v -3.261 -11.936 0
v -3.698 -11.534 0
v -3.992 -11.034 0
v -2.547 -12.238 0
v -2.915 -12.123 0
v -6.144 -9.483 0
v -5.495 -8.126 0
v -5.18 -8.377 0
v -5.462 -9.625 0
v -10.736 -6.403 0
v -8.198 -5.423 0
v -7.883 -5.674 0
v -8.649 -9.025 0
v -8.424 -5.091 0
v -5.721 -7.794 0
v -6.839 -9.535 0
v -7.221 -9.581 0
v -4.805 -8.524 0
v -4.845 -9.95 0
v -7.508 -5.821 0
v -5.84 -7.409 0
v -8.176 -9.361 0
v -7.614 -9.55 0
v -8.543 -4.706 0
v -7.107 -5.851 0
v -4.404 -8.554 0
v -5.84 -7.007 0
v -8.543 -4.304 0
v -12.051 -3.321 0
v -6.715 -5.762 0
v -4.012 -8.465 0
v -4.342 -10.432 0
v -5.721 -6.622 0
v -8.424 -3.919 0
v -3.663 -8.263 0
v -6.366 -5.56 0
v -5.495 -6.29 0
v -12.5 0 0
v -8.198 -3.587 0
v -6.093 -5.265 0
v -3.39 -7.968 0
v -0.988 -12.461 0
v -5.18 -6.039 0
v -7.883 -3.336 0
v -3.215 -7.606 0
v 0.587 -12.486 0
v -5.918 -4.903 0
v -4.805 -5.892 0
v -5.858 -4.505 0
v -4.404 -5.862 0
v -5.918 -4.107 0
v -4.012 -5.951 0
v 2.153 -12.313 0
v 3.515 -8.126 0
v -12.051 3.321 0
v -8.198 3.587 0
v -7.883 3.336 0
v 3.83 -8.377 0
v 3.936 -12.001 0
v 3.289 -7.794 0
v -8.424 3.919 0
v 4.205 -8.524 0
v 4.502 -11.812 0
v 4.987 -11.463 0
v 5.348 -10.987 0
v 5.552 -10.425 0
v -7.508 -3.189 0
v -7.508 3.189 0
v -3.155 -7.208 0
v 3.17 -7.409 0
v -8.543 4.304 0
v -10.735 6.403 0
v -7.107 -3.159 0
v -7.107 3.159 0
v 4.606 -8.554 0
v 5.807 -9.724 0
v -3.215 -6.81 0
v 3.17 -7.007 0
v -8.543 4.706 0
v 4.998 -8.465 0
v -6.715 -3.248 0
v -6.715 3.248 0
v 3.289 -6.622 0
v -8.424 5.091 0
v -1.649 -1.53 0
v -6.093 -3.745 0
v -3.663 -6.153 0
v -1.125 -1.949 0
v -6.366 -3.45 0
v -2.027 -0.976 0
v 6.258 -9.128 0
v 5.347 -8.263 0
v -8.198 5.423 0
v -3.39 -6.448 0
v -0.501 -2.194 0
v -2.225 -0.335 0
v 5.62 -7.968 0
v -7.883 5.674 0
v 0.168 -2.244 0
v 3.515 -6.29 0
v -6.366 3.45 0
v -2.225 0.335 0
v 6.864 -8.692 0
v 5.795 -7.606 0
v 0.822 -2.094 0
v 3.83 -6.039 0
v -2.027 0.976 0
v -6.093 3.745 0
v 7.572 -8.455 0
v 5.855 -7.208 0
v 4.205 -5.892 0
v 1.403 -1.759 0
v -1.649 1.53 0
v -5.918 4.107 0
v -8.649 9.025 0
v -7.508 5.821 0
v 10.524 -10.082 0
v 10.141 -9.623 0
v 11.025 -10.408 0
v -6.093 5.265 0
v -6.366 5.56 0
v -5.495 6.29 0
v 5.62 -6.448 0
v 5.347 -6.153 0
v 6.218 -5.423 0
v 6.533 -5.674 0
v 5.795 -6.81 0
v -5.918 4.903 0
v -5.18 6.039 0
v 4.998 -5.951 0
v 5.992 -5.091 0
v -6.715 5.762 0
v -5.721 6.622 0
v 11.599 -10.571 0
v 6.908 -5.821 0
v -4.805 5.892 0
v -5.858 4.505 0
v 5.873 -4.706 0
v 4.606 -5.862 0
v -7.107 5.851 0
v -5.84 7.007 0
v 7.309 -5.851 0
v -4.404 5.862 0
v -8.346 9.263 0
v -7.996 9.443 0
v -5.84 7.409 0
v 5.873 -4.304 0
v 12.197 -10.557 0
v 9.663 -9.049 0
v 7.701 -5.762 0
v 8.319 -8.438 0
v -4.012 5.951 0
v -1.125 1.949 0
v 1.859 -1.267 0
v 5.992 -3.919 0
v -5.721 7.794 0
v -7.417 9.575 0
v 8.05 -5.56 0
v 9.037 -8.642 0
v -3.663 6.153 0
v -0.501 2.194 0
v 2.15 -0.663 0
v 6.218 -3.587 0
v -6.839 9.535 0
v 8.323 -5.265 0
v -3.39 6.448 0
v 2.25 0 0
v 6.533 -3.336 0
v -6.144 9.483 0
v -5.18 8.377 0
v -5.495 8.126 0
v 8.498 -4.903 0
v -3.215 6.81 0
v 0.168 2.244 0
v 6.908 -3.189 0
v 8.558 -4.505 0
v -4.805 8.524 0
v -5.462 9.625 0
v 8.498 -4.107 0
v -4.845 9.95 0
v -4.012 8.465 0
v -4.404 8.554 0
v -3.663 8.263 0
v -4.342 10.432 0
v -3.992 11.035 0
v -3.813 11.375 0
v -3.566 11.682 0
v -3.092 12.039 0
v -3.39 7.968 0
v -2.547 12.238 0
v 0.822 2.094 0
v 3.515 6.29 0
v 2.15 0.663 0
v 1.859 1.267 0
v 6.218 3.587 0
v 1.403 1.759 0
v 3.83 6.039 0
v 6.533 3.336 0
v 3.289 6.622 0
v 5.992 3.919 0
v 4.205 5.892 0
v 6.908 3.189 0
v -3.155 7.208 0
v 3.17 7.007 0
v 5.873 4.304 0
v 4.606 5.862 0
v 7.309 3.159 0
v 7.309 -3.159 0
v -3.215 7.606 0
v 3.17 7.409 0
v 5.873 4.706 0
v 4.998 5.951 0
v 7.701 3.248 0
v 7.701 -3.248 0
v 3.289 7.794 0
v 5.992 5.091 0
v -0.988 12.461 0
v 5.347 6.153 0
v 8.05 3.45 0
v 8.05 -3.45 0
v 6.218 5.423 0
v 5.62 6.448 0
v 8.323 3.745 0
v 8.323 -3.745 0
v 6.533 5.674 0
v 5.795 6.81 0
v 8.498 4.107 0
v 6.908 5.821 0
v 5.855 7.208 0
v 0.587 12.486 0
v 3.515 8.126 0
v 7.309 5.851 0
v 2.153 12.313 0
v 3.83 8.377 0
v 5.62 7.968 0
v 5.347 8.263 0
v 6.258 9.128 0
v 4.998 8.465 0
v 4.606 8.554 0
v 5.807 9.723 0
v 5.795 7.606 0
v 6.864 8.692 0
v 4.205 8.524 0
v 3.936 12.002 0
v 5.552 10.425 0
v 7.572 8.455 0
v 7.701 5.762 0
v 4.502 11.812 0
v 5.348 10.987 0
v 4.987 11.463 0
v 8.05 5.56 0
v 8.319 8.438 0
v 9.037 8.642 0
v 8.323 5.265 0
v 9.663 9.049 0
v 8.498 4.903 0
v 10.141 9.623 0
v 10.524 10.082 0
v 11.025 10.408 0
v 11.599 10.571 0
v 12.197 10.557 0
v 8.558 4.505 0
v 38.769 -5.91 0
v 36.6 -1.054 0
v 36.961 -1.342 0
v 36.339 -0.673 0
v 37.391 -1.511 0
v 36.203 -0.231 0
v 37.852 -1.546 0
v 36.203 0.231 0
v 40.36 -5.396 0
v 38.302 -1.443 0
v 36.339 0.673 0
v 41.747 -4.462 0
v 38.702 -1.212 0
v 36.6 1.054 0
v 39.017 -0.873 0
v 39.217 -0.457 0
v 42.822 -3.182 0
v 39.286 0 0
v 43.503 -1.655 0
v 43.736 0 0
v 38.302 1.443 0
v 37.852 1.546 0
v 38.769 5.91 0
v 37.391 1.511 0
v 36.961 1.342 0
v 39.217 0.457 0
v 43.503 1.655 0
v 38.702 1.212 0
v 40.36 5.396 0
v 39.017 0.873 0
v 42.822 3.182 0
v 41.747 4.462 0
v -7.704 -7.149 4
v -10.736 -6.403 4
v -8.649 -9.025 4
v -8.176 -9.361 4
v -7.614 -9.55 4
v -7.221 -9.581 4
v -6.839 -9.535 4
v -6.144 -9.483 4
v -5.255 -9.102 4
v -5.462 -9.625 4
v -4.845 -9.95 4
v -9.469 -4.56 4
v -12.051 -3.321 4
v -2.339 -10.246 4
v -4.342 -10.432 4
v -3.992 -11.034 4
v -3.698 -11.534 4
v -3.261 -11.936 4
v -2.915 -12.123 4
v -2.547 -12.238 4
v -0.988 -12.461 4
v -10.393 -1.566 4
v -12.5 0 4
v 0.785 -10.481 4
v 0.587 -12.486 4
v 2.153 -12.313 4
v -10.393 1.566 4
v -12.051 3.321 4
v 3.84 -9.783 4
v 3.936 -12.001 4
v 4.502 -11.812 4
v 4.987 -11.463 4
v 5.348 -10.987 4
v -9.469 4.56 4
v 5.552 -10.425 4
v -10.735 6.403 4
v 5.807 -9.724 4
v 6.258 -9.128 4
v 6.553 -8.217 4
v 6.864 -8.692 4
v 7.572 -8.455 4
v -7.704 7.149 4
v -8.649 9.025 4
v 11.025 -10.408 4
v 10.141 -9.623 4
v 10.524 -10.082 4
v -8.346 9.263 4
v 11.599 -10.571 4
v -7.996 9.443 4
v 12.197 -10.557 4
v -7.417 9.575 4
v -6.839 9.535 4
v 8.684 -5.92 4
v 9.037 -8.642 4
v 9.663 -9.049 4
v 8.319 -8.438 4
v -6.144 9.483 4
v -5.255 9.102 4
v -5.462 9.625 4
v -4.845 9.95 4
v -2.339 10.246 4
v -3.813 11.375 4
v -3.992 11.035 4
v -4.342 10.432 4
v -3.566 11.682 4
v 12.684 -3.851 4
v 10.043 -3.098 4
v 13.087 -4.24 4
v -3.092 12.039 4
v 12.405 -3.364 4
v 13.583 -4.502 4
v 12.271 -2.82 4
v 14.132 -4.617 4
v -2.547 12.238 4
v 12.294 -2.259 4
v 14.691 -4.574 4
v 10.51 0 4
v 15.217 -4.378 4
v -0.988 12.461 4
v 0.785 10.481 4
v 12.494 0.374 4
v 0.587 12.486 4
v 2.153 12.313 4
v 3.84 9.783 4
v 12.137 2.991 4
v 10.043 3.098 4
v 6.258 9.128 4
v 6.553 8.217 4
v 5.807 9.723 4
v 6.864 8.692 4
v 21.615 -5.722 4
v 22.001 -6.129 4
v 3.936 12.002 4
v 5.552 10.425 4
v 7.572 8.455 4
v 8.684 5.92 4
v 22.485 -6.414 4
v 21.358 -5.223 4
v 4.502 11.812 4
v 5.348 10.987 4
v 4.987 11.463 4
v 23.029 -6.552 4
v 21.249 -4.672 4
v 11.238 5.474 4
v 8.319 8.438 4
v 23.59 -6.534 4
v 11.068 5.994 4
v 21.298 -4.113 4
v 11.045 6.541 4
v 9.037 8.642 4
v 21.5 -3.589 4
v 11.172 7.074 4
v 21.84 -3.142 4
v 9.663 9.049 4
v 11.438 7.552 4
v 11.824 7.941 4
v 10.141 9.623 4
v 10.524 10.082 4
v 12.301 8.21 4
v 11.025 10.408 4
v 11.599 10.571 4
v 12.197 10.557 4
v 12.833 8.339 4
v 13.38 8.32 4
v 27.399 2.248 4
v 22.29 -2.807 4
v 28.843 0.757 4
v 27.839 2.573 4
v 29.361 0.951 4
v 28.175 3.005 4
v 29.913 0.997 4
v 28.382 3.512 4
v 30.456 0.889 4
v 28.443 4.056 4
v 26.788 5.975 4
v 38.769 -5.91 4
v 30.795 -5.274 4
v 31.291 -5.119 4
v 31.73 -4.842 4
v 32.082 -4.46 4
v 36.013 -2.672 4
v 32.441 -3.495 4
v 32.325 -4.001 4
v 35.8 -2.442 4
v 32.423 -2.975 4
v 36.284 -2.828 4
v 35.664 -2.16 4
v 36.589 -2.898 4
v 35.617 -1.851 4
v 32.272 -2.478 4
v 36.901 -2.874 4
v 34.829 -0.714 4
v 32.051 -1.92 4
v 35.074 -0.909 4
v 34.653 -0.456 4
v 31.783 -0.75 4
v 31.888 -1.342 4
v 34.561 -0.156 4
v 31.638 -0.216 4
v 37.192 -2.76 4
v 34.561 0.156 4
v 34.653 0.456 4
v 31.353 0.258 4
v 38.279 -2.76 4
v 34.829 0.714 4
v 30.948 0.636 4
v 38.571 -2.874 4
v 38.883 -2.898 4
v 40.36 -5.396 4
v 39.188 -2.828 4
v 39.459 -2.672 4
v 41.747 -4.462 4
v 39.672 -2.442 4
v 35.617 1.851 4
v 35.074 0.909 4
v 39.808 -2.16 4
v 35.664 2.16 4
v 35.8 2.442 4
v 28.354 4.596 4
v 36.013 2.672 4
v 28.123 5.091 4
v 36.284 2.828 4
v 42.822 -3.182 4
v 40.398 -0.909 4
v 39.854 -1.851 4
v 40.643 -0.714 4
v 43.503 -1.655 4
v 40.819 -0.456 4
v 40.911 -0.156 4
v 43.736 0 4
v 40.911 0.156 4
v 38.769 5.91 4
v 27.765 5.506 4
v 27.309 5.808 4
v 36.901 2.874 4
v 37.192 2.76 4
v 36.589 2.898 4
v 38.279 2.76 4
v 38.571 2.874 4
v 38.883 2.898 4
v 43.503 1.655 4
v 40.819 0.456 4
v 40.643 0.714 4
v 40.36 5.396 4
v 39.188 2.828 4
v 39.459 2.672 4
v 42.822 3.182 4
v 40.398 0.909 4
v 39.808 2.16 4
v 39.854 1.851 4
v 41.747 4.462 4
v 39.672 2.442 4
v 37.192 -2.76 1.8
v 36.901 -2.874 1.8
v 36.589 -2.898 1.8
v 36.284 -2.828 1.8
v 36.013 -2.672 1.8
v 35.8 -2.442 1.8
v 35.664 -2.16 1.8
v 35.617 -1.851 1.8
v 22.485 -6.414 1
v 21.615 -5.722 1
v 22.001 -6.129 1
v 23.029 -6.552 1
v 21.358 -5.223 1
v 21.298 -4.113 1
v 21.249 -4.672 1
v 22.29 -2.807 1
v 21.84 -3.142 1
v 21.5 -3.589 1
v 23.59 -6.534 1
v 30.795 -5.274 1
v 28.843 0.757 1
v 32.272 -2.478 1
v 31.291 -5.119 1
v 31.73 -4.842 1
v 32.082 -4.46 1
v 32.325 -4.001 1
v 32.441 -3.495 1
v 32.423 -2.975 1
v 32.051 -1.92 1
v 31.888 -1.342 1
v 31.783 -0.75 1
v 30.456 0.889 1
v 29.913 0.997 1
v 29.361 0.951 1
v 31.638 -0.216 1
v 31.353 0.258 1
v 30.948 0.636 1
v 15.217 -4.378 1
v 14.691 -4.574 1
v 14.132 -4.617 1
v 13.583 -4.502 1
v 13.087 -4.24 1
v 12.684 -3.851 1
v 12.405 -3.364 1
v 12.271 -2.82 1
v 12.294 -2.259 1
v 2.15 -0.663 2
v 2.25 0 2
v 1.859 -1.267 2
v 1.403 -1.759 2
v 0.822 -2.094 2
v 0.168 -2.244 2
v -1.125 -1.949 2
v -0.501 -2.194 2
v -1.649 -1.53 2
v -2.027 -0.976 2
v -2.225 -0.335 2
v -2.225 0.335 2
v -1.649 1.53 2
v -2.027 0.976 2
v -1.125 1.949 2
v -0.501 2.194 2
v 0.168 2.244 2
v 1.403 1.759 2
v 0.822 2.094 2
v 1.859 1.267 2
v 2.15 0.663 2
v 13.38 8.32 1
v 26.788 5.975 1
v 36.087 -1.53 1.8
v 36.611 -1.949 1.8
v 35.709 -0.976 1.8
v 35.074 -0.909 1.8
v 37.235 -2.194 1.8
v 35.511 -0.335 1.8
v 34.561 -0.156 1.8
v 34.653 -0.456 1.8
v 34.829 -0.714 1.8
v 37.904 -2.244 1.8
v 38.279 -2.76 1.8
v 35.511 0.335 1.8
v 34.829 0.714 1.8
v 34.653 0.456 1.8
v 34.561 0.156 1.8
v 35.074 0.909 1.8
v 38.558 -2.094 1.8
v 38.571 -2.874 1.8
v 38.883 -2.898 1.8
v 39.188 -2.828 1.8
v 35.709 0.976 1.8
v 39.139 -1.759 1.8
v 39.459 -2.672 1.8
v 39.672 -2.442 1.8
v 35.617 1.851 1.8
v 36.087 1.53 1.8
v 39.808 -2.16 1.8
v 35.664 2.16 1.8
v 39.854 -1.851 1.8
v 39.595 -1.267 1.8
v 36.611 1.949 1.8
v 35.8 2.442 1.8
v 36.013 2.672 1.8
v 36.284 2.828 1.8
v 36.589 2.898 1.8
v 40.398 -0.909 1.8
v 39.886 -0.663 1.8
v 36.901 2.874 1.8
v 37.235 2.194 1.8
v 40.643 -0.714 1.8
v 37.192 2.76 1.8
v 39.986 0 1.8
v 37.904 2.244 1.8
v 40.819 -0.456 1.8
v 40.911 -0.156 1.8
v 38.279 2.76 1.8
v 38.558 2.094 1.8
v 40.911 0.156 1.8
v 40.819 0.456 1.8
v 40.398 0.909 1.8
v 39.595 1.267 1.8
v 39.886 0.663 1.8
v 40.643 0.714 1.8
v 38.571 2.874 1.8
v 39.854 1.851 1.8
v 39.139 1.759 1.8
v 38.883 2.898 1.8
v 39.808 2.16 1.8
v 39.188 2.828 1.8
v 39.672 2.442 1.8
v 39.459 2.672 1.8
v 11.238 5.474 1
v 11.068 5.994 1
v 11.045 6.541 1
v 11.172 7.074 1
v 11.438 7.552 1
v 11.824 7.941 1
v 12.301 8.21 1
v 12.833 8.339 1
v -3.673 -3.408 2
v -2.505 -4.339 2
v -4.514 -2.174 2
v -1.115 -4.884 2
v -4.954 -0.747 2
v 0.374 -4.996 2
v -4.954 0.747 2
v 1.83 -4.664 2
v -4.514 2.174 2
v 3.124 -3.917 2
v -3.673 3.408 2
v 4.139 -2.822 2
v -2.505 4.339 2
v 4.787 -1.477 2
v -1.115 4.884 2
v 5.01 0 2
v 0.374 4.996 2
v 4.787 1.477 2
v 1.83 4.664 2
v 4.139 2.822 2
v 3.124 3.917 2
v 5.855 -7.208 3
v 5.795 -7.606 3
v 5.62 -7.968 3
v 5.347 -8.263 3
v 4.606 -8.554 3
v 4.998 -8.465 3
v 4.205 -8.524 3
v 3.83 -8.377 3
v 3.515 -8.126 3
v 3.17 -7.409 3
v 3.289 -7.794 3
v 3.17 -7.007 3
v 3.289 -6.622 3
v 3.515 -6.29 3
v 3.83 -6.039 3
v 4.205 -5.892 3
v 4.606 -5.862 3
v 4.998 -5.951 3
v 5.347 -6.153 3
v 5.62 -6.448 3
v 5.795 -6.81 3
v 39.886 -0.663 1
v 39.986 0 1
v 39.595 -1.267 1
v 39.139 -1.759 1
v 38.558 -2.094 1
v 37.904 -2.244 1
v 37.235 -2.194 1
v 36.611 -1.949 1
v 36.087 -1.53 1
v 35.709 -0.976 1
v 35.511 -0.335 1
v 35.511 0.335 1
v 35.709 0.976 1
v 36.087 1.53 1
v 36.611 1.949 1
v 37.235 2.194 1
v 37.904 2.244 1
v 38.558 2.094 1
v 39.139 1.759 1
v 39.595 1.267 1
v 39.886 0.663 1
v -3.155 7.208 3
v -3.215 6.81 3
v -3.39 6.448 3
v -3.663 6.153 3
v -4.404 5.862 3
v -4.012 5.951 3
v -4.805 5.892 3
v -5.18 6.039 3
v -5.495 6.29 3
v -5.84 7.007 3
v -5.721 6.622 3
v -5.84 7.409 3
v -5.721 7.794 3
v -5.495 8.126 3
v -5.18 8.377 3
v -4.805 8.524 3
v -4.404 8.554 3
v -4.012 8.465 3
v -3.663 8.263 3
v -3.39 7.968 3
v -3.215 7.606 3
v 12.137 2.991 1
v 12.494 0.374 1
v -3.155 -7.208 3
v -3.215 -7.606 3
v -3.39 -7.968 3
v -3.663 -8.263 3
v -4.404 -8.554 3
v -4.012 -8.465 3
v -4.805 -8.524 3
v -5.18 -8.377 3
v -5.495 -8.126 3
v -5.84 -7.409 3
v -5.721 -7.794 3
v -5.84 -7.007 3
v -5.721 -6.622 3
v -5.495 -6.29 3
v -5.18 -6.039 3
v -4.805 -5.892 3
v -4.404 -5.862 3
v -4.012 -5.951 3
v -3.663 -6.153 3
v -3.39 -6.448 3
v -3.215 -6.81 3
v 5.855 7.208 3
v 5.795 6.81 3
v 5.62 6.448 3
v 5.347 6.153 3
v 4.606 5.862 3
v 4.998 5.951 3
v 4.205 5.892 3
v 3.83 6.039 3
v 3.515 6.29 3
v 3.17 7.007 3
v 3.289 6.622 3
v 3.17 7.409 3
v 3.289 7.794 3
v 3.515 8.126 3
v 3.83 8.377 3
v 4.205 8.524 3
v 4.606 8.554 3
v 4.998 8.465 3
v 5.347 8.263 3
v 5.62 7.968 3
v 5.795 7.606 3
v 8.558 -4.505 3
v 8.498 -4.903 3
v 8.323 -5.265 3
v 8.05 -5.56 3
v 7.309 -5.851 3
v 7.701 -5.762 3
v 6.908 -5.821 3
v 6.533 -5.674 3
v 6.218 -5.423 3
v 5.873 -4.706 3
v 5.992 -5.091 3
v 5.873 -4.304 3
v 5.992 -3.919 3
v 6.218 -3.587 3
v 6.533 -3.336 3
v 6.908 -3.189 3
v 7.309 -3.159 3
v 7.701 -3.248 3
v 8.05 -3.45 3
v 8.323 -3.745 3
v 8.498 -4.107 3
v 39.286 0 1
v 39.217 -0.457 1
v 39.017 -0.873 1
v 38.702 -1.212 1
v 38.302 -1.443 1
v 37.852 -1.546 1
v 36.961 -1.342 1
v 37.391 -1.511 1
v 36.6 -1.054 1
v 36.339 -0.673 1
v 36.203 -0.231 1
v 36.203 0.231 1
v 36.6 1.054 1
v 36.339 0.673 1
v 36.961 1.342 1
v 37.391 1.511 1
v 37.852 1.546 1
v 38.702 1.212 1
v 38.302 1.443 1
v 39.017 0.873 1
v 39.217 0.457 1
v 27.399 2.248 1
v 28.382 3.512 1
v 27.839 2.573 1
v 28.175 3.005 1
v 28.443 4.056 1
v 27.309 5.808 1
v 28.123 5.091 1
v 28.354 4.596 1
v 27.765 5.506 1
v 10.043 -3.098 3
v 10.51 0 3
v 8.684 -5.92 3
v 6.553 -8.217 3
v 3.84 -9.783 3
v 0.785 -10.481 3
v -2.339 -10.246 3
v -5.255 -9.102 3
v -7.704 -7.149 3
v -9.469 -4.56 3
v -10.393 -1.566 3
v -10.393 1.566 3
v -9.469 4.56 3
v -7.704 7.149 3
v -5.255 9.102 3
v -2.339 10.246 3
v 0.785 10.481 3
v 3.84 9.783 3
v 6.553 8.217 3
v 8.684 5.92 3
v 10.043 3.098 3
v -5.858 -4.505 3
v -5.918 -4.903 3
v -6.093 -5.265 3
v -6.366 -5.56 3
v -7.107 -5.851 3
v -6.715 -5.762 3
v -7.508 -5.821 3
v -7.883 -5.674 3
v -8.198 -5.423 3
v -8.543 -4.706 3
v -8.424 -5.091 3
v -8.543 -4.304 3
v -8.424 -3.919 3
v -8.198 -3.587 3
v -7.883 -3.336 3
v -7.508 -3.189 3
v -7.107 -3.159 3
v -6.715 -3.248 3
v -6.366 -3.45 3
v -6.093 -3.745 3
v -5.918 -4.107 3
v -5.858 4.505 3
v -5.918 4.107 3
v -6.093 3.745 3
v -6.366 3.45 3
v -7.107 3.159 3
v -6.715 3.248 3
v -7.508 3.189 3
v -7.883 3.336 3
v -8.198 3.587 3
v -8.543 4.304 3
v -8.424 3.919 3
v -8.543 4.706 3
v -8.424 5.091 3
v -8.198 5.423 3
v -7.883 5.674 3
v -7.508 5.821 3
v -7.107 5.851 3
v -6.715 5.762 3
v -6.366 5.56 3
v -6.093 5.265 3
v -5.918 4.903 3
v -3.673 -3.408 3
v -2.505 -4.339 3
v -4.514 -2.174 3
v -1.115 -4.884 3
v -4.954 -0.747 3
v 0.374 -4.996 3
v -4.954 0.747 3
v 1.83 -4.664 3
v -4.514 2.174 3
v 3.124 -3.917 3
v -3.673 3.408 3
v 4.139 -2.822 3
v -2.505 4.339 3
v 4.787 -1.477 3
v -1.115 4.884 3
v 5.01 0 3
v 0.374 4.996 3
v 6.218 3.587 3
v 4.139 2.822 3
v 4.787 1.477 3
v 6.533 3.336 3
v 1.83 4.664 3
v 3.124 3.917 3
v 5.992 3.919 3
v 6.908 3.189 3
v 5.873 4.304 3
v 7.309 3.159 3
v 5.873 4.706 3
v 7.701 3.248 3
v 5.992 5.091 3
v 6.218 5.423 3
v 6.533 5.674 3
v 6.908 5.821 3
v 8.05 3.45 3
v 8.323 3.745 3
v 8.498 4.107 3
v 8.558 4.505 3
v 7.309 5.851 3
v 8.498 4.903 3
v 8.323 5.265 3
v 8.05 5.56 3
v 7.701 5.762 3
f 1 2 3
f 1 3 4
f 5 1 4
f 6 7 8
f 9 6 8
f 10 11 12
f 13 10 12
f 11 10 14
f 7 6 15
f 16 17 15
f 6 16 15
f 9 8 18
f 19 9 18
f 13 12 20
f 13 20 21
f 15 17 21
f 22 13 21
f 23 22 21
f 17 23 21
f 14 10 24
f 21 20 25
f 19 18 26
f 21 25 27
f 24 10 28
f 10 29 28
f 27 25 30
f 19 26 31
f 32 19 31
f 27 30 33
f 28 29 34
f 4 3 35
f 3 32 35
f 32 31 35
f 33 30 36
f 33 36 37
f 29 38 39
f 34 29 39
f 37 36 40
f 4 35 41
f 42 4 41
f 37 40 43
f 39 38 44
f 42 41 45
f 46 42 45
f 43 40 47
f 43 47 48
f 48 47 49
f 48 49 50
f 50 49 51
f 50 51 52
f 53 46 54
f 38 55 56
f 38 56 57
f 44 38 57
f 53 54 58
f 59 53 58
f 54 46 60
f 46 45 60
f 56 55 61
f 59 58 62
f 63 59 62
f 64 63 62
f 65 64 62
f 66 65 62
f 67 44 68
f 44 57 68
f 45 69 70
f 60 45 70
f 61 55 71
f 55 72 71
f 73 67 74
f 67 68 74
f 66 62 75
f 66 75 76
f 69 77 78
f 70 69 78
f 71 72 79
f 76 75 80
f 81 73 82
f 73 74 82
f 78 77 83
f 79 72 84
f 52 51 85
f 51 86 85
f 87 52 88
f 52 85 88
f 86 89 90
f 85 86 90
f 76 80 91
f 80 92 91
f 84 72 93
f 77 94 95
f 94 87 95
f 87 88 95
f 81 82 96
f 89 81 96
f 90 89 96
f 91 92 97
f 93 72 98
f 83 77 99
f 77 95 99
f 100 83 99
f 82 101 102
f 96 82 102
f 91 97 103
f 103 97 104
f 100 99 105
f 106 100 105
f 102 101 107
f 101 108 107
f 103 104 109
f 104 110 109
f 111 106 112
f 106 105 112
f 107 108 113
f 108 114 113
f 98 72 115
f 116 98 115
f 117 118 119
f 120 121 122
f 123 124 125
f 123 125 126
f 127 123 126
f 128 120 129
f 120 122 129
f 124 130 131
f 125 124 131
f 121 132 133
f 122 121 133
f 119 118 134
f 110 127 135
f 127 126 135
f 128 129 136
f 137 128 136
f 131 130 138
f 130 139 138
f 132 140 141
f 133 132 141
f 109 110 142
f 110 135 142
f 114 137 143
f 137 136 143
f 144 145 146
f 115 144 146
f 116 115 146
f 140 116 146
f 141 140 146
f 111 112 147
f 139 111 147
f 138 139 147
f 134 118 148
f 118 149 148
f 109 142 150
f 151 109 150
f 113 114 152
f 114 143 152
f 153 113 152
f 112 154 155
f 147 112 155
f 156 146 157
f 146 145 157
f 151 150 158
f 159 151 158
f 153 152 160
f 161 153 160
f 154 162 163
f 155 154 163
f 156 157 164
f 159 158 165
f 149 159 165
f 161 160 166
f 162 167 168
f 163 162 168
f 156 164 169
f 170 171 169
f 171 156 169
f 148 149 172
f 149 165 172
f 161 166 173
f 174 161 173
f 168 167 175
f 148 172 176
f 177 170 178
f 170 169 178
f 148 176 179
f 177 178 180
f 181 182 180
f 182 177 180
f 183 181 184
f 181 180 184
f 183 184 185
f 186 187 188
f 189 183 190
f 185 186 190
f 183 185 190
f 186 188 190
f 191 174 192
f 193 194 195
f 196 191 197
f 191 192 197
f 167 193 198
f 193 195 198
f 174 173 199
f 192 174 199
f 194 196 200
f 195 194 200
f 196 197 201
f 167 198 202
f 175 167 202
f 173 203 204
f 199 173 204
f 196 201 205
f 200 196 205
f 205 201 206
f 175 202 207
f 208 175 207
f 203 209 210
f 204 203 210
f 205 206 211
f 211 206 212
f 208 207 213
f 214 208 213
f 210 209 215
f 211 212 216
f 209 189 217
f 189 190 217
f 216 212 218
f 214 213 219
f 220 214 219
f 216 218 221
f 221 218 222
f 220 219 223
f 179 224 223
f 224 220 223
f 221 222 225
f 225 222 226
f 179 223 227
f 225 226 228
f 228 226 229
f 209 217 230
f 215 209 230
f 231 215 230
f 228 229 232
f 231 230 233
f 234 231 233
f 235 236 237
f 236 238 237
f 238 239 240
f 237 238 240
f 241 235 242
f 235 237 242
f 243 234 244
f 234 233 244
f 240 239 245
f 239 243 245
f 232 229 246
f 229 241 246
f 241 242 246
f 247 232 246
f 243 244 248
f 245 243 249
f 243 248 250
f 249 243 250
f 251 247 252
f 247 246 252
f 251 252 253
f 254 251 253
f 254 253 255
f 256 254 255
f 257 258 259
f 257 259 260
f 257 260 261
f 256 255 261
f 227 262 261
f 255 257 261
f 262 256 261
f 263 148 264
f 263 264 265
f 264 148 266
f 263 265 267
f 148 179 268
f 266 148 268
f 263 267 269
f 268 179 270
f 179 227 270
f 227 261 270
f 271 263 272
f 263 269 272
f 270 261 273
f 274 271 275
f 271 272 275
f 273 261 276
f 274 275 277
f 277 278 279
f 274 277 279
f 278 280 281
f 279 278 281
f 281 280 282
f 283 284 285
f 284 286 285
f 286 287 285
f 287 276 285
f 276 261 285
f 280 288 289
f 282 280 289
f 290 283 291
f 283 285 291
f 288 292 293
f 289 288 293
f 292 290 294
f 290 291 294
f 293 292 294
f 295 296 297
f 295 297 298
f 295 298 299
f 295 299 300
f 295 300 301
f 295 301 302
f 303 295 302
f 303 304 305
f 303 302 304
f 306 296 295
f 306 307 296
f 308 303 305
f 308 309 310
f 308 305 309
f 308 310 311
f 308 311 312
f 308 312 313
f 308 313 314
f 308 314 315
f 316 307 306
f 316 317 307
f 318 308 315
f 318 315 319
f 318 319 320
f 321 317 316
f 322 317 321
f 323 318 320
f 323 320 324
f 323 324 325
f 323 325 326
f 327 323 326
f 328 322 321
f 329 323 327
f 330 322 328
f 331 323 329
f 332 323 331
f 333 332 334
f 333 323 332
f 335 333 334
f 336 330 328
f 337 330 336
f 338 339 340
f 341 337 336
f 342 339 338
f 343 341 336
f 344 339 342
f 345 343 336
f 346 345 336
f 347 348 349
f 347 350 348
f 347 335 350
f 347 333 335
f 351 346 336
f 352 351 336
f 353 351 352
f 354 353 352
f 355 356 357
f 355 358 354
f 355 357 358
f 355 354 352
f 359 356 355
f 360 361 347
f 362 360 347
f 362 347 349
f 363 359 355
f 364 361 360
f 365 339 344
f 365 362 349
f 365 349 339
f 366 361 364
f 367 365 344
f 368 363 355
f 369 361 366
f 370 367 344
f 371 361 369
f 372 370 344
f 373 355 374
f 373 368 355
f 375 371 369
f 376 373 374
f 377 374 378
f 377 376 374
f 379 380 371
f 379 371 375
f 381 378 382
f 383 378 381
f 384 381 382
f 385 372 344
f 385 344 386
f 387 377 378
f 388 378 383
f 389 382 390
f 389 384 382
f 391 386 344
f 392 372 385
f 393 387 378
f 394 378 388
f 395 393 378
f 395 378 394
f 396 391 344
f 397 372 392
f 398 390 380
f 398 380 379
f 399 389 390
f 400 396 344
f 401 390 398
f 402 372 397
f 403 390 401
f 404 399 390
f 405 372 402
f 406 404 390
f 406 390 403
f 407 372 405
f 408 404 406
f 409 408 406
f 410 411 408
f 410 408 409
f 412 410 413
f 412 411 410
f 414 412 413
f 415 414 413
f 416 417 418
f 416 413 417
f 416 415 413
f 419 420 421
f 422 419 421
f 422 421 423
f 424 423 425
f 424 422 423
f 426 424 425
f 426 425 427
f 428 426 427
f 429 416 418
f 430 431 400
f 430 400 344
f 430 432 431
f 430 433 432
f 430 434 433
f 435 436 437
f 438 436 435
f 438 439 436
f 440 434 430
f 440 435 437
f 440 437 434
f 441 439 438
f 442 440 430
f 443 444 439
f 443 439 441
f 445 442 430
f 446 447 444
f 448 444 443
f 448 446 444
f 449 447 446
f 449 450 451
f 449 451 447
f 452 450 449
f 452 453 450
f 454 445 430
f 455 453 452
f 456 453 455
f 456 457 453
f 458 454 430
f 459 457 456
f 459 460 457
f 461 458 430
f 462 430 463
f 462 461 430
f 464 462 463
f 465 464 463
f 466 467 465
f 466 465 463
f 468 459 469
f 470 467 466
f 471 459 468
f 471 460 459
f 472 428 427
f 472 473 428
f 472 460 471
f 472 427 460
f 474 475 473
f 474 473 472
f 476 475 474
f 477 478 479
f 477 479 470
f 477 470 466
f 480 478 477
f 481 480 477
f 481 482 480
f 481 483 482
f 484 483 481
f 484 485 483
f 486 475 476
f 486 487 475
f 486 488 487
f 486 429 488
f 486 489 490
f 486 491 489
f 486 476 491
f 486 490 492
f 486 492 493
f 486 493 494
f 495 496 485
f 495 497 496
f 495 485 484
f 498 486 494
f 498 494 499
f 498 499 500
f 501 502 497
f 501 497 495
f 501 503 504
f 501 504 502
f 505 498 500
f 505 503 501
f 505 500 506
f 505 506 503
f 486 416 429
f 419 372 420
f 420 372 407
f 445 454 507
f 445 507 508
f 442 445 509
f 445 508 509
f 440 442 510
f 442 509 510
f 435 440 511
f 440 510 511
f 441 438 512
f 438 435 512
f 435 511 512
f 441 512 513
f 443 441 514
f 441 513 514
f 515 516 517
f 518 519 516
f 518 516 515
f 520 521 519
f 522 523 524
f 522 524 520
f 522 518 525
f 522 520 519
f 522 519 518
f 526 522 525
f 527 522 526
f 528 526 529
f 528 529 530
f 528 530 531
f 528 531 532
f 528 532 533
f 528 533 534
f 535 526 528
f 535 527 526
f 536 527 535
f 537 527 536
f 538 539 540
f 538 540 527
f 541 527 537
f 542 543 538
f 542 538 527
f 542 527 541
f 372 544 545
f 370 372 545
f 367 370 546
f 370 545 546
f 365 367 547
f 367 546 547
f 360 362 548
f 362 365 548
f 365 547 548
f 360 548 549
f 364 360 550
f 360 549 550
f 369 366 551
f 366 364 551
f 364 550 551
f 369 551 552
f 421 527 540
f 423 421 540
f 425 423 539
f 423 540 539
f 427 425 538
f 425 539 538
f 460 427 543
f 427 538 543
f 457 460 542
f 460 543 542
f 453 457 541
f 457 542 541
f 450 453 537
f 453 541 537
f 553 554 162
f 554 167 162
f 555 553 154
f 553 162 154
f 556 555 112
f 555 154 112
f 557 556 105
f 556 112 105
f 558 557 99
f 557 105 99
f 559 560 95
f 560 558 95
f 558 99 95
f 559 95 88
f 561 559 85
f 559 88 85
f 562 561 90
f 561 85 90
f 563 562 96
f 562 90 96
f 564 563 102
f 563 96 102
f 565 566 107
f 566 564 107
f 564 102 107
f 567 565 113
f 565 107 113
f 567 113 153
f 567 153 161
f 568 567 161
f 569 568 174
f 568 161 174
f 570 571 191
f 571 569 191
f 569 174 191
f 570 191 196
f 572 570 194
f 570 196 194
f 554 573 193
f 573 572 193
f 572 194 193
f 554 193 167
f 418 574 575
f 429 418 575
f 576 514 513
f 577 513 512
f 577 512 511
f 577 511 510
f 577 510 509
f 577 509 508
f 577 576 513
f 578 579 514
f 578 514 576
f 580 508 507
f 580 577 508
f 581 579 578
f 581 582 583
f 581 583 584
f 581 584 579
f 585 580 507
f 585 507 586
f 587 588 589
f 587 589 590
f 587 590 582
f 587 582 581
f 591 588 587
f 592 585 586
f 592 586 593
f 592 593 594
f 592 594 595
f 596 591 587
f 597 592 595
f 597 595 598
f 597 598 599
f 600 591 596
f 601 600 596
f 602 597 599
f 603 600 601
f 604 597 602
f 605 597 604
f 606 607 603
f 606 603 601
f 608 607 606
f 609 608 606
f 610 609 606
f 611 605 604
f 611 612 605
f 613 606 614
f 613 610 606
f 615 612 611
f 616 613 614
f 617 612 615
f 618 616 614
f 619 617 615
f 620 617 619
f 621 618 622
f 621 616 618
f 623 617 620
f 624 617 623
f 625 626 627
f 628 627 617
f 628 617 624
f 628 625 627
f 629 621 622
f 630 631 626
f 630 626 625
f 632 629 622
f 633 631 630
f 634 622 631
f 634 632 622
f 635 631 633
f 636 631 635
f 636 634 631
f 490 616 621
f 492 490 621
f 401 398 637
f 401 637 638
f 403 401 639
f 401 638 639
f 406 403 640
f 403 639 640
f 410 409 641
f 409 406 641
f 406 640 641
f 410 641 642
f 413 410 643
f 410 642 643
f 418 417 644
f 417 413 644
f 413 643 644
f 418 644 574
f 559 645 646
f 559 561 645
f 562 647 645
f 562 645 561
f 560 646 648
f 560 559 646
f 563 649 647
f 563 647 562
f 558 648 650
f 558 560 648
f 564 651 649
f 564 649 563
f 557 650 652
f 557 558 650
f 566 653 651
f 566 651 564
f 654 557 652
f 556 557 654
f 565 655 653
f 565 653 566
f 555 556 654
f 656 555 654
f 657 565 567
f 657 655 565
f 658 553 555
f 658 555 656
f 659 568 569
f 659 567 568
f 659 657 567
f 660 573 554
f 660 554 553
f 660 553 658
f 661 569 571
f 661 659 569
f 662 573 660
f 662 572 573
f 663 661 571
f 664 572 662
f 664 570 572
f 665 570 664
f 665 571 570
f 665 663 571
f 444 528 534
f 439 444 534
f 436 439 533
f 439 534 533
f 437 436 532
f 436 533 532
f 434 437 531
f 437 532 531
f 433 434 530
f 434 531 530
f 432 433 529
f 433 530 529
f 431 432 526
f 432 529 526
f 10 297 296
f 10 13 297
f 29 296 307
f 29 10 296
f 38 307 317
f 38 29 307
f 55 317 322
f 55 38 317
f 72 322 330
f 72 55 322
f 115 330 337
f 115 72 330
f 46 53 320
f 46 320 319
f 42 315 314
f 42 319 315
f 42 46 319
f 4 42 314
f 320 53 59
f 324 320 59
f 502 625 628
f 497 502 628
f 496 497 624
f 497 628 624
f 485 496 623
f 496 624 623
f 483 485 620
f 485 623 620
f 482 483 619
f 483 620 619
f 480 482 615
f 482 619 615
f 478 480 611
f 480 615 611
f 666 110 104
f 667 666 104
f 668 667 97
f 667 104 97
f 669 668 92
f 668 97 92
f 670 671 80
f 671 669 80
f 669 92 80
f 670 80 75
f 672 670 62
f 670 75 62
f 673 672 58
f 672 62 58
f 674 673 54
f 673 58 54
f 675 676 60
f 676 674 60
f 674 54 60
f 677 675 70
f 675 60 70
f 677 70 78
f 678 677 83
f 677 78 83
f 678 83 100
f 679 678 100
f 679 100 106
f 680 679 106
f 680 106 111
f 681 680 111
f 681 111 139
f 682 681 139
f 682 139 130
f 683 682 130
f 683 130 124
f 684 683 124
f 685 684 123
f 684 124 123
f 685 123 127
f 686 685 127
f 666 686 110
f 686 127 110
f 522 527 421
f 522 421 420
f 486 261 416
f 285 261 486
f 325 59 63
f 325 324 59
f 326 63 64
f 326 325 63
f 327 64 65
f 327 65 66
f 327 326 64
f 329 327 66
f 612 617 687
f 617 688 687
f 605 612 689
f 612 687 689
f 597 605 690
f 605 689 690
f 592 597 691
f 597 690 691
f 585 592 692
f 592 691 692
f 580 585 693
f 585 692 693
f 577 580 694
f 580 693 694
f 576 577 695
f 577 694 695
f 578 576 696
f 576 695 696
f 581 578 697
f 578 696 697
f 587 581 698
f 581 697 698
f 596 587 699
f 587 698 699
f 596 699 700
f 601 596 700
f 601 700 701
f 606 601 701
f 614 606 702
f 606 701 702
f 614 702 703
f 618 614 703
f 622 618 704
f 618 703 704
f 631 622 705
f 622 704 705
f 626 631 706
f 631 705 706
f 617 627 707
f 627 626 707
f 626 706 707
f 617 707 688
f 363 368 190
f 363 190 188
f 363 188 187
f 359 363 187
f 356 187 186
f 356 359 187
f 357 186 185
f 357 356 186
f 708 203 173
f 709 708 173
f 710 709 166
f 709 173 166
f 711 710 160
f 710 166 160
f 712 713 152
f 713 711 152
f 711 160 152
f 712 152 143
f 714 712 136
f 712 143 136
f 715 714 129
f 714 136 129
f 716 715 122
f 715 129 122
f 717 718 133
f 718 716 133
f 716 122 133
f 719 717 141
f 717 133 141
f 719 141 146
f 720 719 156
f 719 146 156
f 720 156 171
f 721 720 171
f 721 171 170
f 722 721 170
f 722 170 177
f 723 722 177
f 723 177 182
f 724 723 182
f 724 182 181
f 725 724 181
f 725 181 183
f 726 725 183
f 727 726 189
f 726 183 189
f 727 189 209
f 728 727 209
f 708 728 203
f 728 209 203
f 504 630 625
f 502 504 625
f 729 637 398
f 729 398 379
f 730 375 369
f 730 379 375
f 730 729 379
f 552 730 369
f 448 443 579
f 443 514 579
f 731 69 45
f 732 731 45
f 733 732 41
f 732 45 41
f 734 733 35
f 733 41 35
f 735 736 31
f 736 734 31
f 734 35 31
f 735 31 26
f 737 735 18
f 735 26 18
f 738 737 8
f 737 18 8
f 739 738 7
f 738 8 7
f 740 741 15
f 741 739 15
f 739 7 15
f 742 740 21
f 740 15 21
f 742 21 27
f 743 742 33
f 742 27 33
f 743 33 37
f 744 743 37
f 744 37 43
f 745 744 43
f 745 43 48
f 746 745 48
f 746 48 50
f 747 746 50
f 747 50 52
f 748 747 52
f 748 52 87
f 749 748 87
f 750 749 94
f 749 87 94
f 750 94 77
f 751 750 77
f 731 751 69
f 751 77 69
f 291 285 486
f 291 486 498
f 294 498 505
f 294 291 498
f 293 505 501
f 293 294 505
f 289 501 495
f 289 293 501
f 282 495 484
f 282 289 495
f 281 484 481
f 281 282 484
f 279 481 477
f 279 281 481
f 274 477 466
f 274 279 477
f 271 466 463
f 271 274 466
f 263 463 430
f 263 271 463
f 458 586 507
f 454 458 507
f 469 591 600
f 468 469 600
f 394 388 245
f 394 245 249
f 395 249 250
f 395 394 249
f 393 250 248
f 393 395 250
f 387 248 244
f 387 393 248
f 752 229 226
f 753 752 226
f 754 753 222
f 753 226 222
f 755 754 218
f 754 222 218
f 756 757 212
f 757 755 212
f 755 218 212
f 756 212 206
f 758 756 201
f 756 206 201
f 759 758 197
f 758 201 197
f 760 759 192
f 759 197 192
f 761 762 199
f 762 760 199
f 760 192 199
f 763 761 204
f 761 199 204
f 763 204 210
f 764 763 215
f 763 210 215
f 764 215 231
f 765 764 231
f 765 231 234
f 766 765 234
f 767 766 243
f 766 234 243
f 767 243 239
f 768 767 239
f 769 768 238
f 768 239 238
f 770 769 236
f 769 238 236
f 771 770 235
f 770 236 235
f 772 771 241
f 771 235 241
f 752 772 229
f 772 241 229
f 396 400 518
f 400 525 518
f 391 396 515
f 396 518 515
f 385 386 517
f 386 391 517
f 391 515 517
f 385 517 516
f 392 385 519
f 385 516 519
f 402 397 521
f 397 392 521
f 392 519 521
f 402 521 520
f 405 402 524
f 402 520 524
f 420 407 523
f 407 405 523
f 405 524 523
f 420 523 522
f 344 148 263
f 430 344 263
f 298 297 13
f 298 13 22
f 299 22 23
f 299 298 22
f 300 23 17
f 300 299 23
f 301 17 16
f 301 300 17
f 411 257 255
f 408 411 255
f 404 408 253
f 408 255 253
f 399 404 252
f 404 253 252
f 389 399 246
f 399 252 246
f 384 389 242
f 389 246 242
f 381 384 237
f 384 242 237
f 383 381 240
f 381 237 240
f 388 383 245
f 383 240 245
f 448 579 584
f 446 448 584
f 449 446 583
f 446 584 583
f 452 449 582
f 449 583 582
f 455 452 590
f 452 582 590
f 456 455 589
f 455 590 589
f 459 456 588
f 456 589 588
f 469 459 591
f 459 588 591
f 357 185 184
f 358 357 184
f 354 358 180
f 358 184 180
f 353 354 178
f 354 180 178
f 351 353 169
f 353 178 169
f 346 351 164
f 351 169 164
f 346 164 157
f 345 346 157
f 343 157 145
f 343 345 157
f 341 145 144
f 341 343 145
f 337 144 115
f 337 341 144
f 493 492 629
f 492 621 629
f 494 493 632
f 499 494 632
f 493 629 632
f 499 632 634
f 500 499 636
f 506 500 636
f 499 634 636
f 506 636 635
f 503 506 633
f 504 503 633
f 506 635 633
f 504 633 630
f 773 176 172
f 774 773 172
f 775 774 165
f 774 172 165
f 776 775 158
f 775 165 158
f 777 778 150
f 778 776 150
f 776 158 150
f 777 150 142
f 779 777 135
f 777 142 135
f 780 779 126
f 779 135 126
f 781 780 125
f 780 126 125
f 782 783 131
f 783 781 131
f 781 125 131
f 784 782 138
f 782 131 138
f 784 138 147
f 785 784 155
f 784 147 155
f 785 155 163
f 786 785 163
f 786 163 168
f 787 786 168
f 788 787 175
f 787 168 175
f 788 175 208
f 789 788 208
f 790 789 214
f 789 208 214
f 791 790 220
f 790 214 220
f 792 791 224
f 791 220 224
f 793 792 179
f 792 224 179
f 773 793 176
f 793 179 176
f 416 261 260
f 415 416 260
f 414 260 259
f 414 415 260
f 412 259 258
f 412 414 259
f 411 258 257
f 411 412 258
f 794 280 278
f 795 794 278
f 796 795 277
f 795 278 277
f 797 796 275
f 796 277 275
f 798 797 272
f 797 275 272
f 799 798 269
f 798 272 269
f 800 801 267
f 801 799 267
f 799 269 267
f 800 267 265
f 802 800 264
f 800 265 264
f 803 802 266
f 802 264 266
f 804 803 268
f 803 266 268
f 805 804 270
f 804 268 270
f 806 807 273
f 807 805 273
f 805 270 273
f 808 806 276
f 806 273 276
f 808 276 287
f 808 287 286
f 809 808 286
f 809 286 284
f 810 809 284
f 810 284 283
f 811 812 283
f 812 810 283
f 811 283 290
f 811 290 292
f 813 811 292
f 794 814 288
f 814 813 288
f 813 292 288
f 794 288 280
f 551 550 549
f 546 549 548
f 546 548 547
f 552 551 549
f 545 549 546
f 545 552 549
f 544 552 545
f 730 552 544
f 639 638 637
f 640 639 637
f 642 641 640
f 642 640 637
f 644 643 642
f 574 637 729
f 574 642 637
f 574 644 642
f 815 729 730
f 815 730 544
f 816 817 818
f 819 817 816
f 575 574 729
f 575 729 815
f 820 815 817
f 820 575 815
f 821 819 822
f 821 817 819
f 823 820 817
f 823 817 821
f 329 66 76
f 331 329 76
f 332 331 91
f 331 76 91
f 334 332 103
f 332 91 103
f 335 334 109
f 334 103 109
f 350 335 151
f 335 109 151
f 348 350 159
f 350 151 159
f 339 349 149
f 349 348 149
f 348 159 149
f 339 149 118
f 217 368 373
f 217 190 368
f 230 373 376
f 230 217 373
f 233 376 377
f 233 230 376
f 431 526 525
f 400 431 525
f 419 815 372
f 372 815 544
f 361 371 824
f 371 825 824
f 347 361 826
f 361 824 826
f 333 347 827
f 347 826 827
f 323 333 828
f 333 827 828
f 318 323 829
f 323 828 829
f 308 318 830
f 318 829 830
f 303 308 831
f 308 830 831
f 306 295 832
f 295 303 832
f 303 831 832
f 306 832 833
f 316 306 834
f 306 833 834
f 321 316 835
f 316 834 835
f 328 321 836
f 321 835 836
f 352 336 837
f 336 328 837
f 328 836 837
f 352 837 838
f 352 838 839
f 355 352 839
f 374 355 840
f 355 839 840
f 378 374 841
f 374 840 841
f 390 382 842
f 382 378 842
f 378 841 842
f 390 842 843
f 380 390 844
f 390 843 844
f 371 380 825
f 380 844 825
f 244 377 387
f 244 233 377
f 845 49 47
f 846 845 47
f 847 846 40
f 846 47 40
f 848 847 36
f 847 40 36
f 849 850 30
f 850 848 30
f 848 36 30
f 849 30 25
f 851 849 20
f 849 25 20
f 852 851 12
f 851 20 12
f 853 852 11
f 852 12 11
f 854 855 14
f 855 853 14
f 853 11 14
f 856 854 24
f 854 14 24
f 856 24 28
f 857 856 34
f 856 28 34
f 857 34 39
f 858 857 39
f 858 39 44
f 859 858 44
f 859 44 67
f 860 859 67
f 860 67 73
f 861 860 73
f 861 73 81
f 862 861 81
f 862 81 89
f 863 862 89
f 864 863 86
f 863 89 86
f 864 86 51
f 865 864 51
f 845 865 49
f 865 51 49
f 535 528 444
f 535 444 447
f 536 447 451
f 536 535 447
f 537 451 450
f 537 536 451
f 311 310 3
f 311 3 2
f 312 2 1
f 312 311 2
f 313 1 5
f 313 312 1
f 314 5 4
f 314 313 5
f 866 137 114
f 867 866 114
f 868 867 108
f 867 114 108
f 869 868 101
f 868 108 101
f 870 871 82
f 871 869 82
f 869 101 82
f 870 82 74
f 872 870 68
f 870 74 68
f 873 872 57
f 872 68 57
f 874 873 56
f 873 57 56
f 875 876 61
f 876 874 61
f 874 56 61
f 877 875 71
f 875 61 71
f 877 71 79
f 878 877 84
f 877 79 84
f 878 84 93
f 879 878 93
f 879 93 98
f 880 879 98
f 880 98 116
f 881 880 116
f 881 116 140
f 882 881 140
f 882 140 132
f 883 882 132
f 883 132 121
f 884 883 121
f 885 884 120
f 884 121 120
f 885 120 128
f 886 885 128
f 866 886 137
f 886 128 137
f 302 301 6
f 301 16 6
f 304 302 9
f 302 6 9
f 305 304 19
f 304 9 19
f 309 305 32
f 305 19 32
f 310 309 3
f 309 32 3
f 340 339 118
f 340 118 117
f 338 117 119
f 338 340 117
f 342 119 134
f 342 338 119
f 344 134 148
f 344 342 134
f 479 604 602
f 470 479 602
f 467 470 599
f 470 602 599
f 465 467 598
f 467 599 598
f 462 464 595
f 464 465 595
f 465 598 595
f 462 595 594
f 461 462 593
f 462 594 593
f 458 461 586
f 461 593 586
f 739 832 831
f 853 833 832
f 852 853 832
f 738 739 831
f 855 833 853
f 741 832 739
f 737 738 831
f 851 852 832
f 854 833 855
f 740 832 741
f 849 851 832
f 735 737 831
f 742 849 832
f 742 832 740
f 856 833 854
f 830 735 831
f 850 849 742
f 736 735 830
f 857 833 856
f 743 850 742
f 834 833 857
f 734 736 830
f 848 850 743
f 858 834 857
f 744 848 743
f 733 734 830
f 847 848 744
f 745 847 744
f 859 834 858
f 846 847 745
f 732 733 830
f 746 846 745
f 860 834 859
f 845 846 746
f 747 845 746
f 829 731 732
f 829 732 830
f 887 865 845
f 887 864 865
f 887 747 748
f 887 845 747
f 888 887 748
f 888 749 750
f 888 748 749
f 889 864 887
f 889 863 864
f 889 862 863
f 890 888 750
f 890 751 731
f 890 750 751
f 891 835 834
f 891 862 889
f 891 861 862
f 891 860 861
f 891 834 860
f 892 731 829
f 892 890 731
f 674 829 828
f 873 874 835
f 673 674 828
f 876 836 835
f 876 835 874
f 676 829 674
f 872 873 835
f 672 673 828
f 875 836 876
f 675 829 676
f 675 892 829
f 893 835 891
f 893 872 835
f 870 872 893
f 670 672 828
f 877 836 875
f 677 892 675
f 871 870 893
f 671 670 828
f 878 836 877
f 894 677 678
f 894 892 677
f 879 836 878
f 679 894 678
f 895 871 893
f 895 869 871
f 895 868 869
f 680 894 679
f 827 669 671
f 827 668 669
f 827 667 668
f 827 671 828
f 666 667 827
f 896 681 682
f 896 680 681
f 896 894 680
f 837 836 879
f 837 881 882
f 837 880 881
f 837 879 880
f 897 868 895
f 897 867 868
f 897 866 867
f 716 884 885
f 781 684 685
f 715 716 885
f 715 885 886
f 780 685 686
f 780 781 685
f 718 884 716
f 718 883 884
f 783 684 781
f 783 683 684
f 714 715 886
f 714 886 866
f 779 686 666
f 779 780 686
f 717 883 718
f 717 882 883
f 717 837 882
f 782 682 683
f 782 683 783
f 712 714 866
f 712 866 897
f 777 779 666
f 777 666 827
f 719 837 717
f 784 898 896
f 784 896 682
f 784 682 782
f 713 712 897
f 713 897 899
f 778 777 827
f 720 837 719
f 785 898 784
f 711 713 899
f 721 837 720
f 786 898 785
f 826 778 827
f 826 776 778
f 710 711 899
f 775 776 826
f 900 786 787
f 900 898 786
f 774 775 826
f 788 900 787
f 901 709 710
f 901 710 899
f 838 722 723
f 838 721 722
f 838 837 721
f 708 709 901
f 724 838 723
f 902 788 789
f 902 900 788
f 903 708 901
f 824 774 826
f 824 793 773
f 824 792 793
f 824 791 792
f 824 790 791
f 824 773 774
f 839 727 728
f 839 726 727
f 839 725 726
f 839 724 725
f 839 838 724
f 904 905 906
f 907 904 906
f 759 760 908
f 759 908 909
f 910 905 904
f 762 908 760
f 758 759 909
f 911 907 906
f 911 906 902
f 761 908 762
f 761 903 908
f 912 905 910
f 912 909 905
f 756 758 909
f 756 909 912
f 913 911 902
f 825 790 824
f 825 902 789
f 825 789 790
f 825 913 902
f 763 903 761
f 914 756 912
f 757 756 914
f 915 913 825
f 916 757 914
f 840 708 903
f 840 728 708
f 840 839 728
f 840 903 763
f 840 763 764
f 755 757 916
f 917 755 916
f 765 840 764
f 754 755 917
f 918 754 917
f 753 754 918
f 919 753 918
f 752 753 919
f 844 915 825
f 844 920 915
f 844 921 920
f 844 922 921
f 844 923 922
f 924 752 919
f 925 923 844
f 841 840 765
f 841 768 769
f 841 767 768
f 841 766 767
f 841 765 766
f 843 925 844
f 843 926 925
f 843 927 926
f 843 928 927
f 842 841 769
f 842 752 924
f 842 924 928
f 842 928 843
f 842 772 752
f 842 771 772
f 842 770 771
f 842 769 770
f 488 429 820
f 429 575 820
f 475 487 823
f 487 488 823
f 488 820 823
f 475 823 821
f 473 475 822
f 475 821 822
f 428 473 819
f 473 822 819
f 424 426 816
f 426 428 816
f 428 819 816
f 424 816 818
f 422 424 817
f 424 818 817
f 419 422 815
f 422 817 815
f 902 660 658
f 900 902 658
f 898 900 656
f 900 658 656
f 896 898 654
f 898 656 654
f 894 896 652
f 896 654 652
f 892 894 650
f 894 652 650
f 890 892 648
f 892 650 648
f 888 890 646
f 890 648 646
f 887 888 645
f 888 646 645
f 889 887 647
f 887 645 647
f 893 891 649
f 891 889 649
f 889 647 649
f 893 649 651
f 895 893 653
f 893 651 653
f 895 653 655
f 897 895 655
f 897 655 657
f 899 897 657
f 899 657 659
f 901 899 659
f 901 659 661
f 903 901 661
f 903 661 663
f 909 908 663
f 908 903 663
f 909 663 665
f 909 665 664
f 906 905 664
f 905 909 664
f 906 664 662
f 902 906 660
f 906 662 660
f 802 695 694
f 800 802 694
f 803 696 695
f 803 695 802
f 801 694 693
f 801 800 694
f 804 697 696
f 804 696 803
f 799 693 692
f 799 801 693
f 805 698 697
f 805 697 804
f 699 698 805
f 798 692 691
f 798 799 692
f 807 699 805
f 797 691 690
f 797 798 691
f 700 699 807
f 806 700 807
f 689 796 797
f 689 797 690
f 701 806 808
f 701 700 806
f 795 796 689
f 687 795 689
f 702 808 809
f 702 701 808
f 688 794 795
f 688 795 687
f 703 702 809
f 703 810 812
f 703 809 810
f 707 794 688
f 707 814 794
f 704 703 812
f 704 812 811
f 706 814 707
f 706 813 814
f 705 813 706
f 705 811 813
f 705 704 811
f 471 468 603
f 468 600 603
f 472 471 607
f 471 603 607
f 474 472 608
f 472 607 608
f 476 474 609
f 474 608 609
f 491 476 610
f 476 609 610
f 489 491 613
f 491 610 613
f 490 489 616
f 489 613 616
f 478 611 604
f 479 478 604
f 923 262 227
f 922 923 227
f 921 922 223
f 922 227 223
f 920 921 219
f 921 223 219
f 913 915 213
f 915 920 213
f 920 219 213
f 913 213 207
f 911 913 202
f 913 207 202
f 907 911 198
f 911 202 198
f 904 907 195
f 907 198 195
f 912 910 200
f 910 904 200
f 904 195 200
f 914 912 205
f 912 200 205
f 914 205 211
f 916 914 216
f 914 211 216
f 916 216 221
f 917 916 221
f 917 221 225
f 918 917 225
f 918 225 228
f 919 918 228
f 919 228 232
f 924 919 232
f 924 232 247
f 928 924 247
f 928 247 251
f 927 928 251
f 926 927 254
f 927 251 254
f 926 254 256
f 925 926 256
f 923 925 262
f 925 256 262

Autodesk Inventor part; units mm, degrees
ref_plane "YZ Plane" through (0, 0, 0) normal (1, 0, 0) x (0, 1, 0)
ref_plane "XZ Plane" through (0, 0, 0) normal (0, 1, 0) x (-1, 0, 0)
ref_plane "XY Plane" through (0, 0, 0) normal (0, 0, 1) x (1, 0, 0)
sketch "スケッチ1" plane through (0, 0, 0) normal (0, 0, 1) x (1, 0, 0)
  circle A0 centre (0, 0) radius 10.5 construction
  circle A1 centre (0, 0) radius 5 construction
  circle A2 centre (0, 0) radius 5.01
  circle A3 centre (0, 0) radius 10.51
  arc A4 (2.1531, 12.3132) -> (2.1531, -12.3132) centre (0, 0) ccw
  circle A5 centre (37.7359, 0) radius 2.25
  arc A6 (38.7694, -5.9103) -> (38.7694, 5.9103) centre (37.7359, 0) ccw
  line L0 (2.1531, 12.3132) -> (38.7694, 5.9103)
  line L1 (2.1531, -12.3132) -> (38.7694, -5.9103)
  line L2 (13.3804, 8.3196) -> (26.7879, 5.9751)
  line L3 (30.7947, -5.2745) -> (23.5904, -6.5342)
  arc A7 (2.1531, -12.3132) -> (-4.7001, 11.5827) centre (0, 0) ccw construction
  arc A8 (38.7694, 5.9103) -> (32.2717, -2.4783) centre (37.7359, 0) ccw construction
  line L4 (34.0196, 4.7105) -> (8.4896, -9.1748) construction
  line L5 (27.399, 2.248) -> (15.2168, -4.3777)
  line L6 (28.8431, 0.7568) -> (22.2903, -2.8072)
  line L7 (32.4358, 4.9875) -> (34.0196, 4.7105) construction
  line L8 (11.5743, -8.6354) -> (8.4896, -9.1748) construction
  arc A9 (31.783, -0.7501) -> (32.2717, -2.4783) centre (37.7359, 0) ccw
  arc A10 (12.2941, -2.2592) -> (11.2378, 5.4737) centre (0, 0) ccw
  line L9 (40.9229, 0) -> (40.3979, -0.9093) construction
  line L10 (39.3294, -2.76) -> (38.2794, -2.76) construction
  line L11 (36.1424, -2.76) -> (35.6174, -1.8507) construction
  line L12 (34.549, 0) -> (35.074, 0.9093) construction
  line L13 (36.1424, 2.76) -> (37.1924, 2.76) construction
  line L14 (39.3294, 2.76) -> (39.8544, 1.8507)
  arc A11 (40.3979, -0.9093) -> (40.3979, 0.9093) centre (39.8729, 0) ccw
  arc A12 (39.8544, 1.8507) -> (38.2794, 2.76) centre (38.8044, 1.8507) ccw
  arc A13 (37.1924, 2.76) -> (35.6174, 1.8507) centre (36.6674, 1.8507) ccw
  arc A14 (35.074, 0.9093) -> (35.074, -0.9093) centre (35.599, 0) ccw
  arc A15 (35.6174, -1.8507) -> (37.1924, -2.76) centre (36.6674, -1.8507) ccw
  arc A16 (38.2794, -2.76) -> (39.8544, -1.8507) centre (38.8044, -1.8507) ccw
  line L15 (40.3979, -0.9093) -> (39.8544, -1.8507)
  line L16 (39.8544, -1.8507) -> (39.3294, -2.76) construction
  line L17 (38.2794, -2.76) -> (37.1924, -2.76)
  line L18 (37.1924, -2.76) -> (36.1424, -2.76) construction
  line L19 (35.6174, -1.8507) -> (35.074, -0.9093)
  line L20 (35.074, -0.9093) -> (34.549, 0) construction
  line L21 (35.6174, 1.8507) -> (36.1424, 2.76) construction
  line L22 (35.074, 0.9093) -> (35.6174, 1.8507)
  line L23 (37.1924, 2.76) -> (38.2794, 2.76)
  line L24 (38.2794, 2.76) -> (39.3294, 2.76) construction
  line L25 (39.8544, 1.8507) -> (40.3979, 0.9093)
  line L26 (40.3979, 0.9093) -> (40.9229, 0) construction
  circle A17 centre (37.7359, 0) radius 1.55
  circle A18 centre (0, 0) radius 2.25
  line L27 (0, 0) -> (27.1359, -16.96) construction
  line L28 (37.7359, 0) -> (27.1359, -16.96) construction
  line L29 (0, 0) -> (37.7359, 0) construction
  line L30 (0, 0) -> (0.848, -0.53)
  line L31 (8.003, 10.918) -> (-6.307, -11.978) construction
  arc A19 (-3.808, -11.9058) -> (-7.6616, -9.8768) centre (-6.307, -11.978) ccw
  arc A20 (5.6301, 11.7052) -> (10.5021, 10.8532) centre (8.003, 10.918) ccw
  arc A21 (13.3804, 8.3196) -> (11.2378, 5.4737) centre (13.0359, 6.3495) ccw
  arc A22 (12.2941, -2.2592) -> (15.2168, -4.3777) centre (14.2612, -2.6207) ccw
  arc A23 (22.2903, -2.8072) -> (23.5904, -6.5342) centre (23.2459, -4.5641) ccw
  arc A24 (30.7947, -5.2745) -> (32.2717, -2.4783) centre (30.4502, -3.3043) ccw
  arc A25 (31.783, -0.7501) -> (28.8431, 0.7568) centre (29.7987, -1.0002) ccw
  arc A26 (27.399, 2.248) -> (26.7879, 5.9751) centre (26.4434, 4.005) ccw
  line L32 (8.003, -10.918) -> (-6.307, 11.978) construction
  arc A27 (-7.6616, 9.8768) -> (-3.808, 11.9058) centre (-6.307, 11.978) ccw
  arc A28 (10.5021, -10.8532) -> (5.6301, -11.7052) centre (8.003, -10.918) ccw
  line L33 (-6.625, -10.6) -> (6.625, 10.6) construction
  circle A29 centre (4.505, 7.208) radius 1.35
  circle A30 centre (-7.208, 4.505) radius 1.35
  circle A31 centre (-4.505, -7.208) radius 1.35
  circle A32 centre (7.208, -4.505) radius 1.35
  circle A33 centre (4.505, -7.208) radius 1.35
  circle A34 centre (-7.208, -4.505) radius 1.35
  circle A35 centre (-4.505, 7.208) radius 1.35
  circle A36 centre (7.208, 4.505) radius 1.35
  point P0 (8.4896, 9.1748)
  point P1 (34.0196, -4.7105)
  point P2 (10.3333, -7.0337)
  point P3 (32.3635, 2.6714)
  point P4 (39.3294, 2.76)
  point P5 (9.5861, 8.9831)
  point P6 (9.0332, 8.6401)
  point P7 (-3.808, 11.9058)
  dimension "d0" = 21
  dimension "d1" = 10
  dimension "d2" = 0.01
  dimension "d3" = 0.01
  dimension "d4" = 25
  dimension "d7" = 4.5
  dimension "d8" = 6
  dimension "d15" = 2
  dimension "d16" = 2
  dimension "d17" = 1
  dimension "d18" = 1
  dimension "d20" = 1.05
  dimension "d23" = 360
  dimension "d25" = 5.52
  dimension "d30" = 3.1
  dimension "d33" = 4.5
  dimension "d41" = 20
  dimension "d42" = 32
  dimension "d46" = 27
  dimension "d47" = 1
  dimension "d48" = 90
  dimension "d49" = 2.5
  dimension "d50" = 2.5
  dimension "d51" = 2
  dimension "d52" = 2
  dimension "d53" = 2
  dimension "d55" = 2.5
  dimension "d56" = 2.5
  dimension "d57" = 2.7
  dimension "d58" = 8.5
  dimension "d61" = 360
extrude "押し出し1" add sketch "スケッチ1" along normal blind 4 contours L0 A20 A6 L1 A28 A4 A19 A27
extrude "押し出し2" add sketch "スケッチ1" along normal blind 1.8 contours A12 L14 | L14 L25 A11 L15 A16 L17 A15 L19 A14 L22 A13 L23 A12
extrude "押し出し3" add sketch "スケッチ1" along normal blind 1 contours A5
extrude "押し出し4" add sketch "スケッチ1" along normal blind 3 contours A3
extrude "押し出し5" add sketch "スケッチ1" along normal blind 2 contours A2
extrude "押し出し6" add sketch "スケッチ1" along normal blind 1 contours L2 A26 L5 A22 A10 A21 | L3 A23 L6 A25 A9 A24
fillet "フィレット2" radius 2 8 edges at (-3.808, -11.9058, 2) (-7.6616, -9.8768, 2) (10.5021, 10.8532, 2) (5.6301, 11.7052, 2) (5.6301, -11.7052, 2) (10.5021, -10.8532, 2) (-7.6616, 9.8768, 2) (-3.808, 11.9058, 2)
equation "\"d3\" = d2"
equation "\"d18\" = d17"
equation "\"d50\" = d49"
properties part number "Ankle_side_pitch_frame" material "アルミニウム 2014-T4"
